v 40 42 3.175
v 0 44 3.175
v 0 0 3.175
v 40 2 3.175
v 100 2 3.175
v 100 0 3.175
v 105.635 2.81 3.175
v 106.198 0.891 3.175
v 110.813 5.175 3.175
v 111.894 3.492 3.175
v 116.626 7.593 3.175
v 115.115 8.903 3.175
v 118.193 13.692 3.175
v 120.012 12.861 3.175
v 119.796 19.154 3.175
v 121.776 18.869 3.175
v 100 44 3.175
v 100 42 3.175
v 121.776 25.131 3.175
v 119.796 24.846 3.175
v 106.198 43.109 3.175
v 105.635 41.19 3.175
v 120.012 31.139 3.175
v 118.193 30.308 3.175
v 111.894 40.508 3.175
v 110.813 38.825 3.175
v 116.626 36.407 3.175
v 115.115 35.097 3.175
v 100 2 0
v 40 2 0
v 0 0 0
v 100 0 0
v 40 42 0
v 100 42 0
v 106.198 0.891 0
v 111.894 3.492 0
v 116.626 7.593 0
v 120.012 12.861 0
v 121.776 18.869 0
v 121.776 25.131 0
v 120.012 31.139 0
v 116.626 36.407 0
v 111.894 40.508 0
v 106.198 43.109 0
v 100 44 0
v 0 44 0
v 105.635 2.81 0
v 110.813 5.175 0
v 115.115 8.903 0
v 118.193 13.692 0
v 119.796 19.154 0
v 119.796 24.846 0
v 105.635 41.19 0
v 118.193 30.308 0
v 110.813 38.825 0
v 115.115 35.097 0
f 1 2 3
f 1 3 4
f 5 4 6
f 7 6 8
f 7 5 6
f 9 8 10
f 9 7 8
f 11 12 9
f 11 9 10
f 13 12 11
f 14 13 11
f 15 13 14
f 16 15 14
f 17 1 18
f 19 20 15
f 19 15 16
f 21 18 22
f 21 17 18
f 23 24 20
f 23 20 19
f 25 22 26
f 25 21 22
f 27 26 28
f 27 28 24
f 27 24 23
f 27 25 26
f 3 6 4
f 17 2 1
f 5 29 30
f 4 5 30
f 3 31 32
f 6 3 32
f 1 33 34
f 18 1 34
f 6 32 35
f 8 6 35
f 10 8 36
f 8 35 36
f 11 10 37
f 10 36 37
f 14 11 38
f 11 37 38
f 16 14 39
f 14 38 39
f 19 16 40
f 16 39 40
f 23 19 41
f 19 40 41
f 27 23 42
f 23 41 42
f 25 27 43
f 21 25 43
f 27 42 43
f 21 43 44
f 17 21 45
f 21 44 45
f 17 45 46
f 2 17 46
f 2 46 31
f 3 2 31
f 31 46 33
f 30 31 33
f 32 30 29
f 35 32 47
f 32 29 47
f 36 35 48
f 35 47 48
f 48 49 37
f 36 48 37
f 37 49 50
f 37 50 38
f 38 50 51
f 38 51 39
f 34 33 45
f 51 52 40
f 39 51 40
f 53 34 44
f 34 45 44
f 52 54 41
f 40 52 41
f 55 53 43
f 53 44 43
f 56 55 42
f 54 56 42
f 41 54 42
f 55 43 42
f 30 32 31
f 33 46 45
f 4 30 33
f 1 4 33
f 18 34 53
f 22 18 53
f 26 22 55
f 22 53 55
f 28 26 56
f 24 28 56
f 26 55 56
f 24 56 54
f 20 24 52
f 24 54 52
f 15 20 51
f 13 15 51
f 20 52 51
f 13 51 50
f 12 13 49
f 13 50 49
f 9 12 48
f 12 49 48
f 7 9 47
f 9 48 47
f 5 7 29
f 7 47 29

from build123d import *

# Parameters (mm, degrees)
BOSS_EXTRUDE1_DEPTH = 3.175


with BuildPart() as part:
    # Sketch1 → Boss-Extrude1 (new body)
    with BuildSketch(Plane.XY):
        with BuildLine():
            Line((0, 0), (100, 0))
            ThreePointArc((100, 0), (122, 22), (100, 44))
            Line((100, 44), (0, 44))
            Line((0, 44), (0, 0))
        make_face()
        with BuildLine():
            Line((40, 2), (40, 42))
            Line((40, 42), (100, 42))
            ThreePointArc((100, 42), (120, 22), (100, 2))
            Line((100, 2), (40, 2))
        make_face(mode=Mode.SUBTRACT)
    extrude(amount=BOSS_EXTRUDE1_DEPTH)


solid = part.part
